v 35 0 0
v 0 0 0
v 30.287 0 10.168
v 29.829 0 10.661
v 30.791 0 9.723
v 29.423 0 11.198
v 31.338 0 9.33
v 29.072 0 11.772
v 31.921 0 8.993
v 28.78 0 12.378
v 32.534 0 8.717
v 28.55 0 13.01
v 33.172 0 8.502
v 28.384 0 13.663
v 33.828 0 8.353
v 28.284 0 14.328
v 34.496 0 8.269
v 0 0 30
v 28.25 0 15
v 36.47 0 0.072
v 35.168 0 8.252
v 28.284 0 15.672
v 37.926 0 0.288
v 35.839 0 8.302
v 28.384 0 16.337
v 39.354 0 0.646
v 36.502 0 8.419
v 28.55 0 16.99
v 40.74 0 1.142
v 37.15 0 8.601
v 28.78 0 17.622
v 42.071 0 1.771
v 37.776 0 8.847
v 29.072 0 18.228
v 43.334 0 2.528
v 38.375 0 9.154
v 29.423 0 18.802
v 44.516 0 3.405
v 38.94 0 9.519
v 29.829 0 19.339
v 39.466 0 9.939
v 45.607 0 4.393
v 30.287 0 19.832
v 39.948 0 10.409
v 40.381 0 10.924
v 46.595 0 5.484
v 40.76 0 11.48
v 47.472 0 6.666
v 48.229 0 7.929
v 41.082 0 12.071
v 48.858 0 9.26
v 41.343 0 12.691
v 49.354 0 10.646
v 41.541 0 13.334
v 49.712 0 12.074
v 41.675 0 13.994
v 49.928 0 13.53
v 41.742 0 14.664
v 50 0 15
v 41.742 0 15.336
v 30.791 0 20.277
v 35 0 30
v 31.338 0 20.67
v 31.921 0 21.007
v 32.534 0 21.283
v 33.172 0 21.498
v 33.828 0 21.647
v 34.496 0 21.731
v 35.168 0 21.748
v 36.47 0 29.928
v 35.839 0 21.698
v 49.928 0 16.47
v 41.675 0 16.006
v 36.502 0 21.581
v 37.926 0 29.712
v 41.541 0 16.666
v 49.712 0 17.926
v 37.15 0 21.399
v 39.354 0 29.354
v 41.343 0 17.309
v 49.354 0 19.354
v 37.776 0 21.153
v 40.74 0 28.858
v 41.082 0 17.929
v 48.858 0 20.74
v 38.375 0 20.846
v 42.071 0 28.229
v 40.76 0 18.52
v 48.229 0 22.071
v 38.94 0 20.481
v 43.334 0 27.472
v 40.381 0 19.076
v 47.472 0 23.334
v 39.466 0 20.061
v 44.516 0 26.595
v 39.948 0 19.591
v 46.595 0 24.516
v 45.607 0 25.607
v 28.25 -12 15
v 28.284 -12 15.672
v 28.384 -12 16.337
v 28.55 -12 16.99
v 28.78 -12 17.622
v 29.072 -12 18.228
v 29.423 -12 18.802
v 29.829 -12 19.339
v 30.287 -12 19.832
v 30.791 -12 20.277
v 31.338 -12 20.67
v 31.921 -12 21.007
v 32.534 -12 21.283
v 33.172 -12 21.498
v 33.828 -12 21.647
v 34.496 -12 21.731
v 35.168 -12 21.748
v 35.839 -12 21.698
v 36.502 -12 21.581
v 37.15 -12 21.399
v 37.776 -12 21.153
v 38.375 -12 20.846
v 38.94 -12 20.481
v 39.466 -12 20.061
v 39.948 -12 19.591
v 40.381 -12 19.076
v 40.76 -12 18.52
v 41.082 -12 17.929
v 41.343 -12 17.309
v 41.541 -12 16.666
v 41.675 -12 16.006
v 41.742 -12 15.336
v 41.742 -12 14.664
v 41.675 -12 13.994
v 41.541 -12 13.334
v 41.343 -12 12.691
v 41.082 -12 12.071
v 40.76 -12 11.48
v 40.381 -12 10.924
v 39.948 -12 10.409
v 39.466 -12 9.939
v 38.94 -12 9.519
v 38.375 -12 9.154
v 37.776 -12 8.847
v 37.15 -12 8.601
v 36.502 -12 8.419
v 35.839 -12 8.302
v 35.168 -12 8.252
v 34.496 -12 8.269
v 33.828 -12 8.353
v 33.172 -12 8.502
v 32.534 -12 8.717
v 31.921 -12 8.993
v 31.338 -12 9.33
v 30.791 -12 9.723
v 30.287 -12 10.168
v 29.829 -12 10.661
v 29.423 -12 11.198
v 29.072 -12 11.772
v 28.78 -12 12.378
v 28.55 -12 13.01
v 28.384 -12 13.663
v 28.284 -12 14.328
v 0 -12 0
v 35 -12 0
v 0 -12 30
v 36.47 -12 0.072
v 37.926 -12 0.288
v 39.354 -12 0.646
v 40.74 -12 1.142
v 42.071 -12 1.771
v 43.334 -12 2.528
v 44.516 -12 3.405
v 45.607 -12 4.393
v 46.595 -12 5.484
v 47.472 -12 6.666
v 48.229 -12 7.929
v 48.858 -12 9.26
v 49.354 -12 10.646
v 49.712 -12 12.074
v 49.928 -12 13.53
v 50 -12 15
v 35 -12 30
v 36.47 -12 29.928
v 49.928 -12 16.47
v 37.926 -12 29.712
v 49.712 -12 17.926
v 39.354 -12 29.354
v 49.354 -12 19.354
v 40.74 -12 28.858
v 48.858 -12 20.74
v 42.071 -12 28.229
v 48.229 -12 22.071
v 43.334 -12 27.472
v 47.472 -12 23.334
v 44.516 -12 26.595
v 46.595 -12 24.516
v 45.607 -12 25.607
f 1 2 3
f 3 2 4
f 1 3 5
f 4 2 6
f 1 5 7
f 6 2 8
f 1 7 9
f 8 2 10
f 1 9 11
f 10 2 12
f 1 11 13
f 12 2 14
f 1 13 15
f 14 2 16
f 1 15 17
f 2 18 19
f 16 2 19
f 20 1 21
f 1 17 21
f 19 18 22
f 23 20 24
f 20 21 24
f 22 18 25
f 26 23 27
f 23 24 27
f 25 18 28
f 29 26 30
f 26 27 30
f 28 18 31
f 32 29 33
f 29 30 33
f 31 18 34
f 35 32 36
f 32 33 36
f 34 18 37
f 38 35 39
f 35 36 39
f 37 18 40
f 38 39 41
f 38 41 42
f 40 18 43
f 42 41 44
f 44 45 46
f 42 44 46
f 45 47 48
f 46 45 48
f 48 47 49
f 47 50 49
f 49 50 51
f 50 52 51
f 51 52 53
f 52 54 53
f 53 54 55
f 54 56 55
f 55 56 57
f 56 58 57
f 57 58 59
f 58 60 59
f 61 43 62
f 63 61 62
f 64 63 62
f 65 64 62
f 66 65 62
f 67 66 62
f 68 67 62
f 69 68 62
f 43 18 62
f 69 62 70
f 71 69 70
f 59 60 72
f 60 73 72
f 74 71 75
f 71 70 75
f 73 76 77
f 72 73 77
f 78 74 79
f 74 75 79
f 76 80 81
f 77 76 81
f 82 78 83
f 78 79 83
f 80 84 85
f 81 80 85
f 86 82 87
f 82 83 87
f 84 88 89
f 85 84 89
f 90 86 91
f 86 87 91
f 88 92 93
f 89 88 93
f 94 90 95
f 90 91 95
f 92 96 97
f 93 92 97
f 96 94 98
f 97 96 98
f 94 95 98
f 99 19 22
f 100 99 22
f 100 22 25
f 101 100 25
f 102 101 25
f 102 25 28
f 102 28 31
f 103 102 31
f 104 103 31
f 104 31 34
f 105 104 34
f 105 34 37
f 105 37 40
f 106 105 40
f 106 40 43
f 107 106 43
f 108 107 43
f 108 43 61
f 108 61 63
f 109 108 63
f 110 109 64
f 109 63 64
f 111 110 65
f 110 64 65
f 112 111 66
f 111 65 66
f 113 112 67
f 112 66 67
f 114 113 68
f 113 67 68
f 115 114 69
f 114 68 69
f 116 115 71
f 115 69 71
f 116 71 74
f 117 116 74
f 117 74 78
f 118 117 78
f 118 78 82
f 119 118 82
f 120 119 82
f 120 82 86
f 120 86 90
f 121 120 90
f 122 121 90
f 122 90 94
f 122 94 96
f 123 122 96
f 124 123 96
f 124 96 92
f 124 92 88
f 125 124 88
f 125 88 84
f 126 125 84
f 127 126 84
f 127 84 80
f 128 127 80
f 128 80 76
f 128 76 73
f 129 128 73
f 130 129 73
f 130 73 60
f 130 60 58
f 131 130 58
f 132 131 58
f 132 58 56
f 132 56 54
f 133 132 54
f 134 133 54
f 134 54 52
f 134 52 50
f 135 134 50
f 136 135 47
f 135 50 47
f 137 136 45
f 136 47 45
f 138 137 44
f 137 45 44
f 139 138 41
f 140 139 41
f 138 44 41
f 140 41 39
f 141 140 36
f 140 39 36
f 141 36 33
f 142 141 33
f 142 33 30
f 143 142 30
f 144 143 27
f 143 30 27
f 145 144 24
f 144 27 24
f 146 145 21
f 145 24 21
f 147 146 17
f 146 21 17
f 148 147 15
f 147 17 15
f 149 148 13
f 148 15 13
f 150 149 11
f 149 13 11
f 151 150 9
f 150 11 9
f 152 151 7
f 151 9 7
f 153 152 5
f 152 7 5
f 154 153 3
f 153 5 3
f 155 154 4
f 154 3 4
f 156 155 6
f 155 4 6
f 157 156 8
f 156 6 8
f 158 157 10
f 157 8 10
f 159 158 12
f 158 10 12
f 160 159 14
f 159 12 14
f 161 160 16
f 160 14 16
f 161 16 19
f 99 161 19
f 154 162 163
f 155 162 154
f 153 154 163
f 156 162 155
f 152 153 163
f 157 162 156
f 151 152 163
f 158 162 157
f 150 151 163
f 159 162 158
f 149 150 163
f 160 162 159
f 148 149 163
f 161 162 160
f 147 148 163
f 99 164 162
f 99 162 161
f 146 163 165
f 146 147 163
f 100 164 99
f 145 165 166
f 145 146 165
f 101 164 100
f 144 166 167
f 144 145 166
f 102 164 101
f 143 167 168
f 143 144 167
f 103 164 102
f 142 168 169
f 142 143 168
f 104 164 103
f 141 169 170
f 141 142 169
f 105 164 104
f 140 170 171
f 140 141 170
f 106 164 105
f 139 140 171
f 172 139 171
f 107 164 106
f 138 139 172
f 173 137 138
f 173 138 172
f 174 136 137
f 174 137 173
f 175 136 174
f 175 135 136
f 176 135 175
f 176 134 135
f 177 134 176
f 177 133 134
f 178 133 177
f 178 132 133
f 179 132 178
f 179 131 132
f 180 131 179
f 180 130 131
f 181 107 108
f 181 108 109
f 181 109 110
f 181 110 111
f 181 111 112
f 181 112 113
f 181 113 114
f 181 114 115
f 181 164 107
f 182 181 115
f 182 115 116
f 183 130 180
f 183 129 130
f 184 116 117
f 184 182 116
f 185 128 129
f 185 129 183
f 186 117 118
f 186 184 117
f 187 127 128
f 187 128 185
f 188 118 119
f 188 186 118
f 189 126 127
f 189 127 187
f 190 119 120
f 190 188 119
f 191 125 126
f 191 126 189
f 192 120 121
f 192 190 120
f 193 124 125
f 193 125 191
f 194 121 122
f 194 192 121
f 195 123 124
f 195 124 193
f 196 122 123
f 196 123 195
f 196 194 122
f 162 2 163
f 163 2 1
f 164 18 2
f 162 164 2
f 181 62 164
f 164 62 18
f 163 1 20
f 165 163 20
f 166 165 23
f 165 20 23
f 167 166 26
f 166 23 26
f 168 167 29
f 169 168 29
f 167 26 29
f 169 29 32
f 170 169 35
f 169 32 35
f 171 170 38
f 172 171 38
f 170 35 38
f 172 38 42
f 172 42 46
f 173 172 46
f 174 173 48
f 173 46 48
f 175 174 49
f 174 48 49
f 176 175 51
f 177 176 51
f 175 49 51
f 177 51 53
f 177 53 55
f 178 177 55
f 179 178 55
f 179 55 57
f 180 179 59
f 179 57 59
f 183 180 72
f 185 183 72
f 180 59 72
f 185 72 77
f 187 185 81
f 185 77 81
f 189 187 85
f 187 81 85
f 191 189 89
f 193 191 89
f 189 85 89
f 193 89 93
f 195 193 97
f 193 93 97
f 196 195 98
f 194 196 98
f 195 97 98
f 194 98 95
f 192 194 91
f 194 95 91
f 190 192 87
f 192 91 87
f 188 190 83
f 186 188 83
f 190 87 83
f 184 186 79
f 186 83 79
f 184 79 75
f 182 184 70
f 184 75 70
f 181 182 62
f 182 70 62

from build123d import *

# Parameters (mm, degrees)
F1_DEPTH = 12
F3_D     = 13.5


with BuildPart() as f1:
    # F0 (on Front) → F1 (new body)
    with BuildSketch(Plane.XZ):
        with BuildLine():
            Line((0, 30), (0, 0))
            Line((0, 0), (35, 0))
            ThreePointArc((35, 0), (45.6066017178, 4.3933982822), (50, 15))
            ThreePointArc((50, 15), (45.6066017178, 25.6066017178), (35, 30))
            Line((35, 30), (0, 30))
        make_face()
    extrude(amount=F1_DEPTH)

    # F3 (through all)
    with Locations(Plane.XZ.offset(12)):
        with Locations((35, 15)):
            Hole(F3_D / 2)


solid = f1.part
